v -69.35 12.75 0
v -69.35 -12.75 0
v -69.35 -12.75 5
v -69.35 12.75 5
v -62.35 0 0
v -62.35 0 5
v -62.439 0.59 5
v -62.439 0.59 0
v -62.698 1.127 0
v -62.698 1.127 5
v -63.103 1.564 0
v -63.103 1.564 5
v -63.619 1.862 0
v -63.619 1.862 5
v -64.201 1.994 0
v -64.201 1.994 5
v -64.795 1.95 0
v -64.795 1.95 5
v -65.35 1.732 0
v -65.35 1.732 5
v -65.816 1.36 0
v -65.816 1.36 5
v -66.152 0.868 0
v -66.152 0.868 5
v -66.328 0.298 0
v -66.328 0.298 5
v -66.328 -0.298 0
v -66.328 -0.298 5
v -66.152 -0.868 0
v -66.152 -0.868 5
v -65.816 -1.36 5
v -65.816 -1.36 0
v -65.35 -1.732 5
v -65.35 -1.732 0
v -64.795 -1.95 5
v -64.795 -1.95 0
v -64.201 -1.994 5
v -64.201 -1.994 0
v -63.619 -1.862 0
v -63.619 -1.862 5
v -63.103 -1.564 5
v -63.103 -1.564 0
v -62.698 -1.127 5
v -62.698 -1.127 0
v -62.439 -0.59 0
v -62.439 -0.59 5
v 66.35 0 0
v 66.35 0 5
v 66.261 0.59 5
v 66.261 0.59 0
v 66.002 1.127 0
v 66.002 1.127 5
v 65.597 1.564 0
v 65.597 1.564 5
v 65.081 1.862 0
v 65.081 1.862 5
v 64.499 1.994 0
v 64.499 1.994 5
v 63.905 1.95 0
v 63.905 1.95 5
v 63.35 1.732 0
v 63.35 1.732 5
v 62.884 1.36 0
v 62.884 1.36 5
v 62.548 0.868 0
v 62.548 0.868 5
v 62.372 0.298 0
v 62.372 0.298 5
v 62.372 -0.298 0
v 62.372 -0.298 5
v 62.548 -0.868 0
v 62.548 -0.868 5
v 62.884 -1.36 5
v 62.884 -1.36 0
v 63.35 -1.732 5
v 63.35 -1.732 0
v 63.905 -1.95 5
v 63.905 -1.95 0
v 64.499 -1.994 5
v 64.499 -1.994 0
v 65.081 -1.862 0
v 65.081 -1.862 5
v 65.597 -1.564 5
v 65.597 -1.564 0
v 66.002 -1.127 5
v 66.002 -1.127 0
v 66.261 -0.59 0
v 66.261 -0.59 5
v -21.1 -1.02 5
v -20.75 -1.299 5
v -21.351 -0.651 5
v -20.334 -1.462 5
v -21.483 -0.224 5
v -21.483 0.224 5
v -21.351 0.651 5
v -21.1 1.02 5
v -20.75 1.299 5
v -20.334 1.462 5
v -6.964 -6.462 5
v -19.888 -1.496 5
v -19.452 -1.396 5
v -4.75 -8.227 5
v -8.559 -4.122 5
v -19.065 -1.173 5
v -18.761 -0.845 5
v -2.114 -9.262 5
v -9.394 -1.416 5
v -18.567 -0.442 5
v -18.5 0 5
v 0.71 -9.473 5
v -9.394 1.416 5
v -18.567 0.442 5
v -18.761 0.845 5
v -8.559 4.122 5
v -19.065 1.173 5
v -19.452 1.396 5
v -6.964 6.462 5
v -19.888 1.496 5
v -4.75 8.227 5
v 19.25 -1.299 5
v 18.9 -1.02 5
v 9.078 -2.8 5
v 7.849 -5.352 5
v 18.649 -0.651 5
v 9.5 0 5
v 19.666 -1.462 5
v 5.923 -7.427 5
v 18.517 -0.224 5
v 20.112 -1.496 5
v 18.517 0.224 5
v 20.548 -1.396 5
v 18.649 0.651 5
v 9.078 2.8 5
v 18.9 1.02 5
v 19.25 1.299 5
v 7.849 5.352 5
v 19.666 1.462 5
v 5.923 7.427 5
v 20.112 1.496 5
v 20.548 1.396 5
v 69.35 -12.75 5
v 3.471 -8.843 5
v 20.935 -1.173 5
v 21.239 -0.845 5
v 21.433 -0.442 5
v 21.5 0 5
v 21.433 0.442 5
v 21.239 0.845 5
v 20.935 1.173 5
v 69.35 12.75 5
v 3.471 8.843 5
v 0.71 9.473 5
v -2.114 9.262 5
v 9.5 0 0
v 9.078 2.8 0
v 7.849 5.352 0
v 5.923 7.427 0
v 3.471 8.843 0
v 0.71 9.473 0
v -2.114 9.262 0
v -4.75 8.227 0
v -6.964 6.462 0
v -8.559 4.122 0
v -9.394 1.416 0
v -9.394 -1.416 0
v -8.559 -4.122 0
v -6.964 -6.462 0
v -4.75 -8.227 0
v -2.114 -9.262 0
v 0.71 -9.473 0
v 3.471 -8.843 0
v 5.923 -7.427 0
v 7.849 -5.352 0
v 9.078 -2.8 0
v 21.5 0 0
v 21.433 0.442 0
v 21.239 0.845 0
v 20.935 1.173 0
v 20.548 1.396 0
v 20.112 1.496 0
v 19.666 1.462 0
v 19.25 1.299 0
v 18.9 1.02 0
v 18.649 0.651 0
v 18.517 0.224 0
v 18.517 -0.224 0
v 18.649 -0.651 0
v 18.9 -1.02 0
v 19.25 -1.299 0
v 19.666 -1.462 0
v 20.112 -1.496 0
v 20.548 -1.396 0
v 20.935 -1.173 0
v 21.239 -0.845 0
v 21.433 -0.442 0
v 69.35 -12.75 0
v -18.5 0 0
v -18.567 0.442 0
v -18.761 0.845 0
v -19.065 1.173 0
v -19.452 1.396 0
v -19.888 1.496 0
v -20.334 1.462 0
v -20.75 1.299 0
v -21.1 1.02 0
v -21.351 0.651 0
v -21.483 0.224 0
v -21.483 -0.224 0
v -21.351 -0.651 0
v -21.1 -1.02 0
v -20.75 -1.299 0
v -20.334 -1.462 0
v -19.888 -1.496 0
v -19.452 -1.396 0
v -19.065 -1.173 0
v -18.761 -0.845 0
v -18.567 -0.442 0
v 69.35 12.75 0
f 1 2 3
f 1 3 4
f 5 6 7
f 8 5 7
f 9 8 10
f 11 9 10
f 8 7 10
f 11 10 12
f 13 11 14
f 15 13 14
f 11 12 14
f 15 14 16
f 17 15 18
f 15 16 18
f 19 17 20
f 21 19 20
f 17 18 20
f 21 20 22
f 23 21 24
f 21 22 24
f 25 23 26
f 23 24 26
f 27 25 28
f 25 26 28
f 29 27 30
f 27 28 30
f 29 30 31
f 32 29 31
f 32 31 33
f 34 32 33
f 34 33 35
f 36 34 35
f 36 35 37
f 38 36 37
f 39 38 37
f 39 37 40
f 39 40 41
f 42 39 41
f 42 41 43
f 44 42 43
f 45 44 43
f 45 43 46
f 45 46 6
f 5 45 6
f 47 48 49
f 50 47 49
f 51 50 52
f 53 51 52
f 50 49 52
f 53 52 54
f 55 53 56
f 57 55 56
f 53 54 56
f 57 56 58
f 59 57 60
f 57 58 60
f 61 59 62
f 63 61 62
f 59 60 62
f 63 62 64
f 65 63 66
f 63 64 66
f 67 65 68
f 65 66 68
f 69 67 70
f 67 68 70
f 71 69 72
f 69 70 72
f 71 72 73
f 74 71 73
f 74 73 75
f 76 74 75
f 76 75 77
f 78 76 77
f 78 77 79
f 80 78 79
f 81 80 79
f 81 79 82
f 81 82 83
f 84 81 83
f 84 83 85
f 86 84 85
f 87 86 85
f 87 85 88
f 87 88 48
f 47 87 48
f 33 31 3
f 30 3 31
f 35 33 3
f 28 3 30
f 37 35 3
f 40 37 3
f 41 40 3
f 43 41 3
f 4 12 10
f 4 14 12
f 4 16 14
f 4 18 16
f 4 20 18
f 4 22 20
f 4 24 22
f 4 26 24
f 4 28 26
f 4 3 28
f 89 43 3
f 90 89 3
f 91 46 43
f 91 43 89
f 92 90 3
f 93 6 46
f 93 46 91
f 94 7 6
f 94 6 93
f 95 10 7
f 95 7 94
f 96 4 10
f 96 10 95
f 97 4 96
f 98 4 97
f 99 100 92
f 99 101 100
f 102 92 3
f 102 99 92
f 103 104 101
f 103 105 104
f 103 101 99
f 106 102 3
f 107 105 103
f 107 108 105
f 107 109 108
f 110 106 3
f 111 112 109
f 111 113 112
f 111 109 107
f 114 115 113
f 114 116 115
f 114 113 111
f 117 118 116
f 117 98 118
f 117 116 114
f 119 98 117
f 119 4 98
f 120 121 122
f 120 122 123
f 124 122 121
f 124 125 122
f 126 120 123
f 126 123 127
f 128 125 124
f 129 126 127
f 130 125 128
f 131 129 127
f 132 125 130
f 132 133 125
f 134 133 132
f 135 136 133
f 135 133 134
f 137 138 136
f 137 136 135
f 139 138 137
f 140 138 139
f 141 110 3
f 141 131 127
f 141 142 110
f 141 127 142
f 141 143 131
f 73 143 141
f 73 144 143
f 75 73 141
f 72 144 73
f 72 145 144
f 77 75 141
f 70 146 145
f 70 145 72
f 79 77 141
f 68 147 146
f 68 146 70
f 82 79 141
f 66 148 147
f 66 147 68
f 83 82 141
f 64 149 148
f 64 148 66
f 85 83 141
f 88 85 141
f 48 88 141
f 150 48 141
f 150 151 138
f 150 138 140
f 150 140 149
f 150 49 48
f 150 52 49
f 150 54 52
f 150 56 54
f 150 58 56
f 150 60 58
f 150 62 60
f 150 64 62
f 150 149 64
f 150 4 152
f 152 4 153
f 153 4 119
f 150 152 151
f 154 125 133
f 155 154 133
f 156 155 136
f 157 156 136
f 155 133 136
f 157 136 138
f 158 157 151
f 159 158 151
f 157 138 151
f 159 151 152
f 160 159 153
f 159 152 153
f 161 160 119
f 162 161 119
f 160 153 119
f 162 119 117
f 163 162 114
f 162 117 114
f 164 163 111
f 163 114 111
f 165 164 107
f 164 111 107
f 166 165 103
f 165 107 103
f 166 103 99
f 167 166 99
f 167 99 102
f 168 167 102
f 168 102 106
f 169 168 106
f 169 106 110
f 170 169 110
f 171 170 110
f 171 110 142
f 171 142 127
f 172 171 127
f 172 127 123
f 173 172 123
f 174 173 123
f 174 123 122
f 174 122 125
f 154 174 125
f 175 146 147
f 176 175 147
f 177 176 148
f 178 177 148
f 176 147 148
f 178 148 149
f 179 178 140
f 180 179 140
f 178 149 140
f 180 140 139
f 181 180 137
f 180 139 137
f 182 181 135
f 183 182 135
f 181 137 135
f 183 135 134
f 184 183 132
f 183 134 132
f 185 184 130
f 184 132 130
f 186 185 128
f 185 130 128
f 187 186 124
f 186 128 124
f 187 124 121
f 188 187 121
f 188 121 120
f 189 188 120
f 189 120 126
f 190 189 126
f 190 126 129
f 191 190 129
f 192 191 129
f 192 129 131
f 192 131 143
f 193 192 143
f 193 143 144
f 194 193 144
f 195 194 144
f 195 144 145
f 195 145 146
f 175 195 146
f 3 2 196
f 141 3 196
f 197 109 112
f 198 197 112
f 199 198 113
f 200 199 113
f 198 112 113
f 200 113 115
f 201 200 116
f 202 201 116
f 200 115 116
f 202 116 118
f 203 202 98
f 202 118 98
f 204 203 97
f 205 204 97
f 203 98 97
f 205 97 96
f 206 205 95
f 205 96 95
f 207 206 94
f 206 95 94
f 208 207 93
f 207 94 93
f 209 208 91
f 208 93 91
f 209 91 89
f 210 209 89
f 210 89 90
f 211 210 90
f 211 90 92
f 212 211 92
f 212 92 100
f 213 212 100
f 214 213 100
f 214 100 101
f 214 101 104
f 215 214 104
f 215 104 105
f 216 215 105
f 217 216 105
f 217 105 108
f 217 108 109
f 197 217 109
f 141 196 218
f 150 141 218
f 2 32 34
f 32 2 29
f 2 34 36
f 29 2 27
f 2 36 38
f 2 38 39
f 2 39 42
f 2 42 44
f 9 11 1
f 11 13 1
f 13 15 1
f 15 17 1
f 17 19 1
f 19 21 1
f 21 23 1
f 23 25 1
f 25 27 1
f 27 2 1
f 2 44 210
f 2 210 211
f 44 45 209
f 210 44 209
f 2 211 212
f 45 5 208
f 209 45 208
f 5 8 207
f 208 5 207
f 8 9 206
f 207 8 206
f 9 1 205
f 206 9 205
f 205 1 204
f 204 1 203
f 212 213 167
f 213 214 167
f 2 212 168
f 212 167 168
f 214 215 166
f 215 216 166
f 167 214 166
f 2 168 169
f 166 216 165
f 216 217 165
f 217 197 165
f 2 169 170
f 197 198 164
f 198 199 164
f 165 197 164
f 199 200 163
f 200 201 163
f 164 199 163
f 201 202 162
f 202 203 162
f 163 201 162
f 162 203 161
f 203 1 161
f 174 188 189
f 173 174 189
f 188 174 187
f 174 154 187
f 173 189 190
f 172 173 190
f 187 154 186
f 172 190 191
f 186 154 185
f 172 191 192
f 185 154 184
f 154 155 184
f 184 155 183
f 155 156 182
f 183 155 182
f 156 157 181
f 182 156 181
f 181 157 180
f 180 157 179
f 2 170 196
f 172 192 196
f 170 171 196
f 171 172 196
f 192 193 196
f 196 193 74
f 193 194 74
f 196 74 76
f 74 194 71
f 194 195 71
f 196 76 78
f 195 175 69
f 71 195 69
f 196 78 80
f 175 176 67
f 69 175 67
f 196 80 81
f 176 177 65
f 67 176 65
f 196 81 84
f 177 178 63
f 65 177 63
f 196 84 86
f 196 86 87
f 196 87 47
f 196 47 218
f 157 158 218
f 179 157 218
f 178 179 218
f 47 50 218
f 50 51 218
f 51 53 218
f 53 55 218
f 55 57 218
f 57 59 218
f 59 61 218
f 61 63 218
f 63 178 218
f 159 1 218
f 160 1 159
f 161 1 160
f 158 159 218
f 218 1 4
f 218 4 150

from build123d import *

# Parameters (mm, degrees)
F0_W     = 138.7
F0_H     = 25.5
F1_DEPTH = 5
F2_R     = 9.5
F3_DEPTH = 25
F5_R     = 2
F5_R_2   = 1.5
F6_DEPTH = 25


with BuildPart() as f1:
    # F0 (on Top) → F1 (new body)
    with BuildSketch(Plane.XY):
        Rectangle(F0_W, F0_H)
    extrude(amount=F1_DEPTH)

    # F2 (on face) → F3 (cut)
    with BuildSketch(Plane.XY.offset(5)):
        Circle(F2_R)
    extrude(amount=-F3_DEPTH, mode=Mode.SUBTRACT)

    # F5 (on face) → F6 (cut)
    with BuildSketch(Plane.XY.offset(5)):
        with Locations((-64.35, 0)):
            Circle(F5_R)
        with Locations((64.35, 0)):
            Circle(F5_R)
        with Locations((20, 0)):
            Circle(F5_R_2)
        with Locations((-20, 0)):
            Circle(F5_R_2)
    extrude(amount=-F6_DEPTH, mode=Mode.SUBTRACT)


solid = f1.part
